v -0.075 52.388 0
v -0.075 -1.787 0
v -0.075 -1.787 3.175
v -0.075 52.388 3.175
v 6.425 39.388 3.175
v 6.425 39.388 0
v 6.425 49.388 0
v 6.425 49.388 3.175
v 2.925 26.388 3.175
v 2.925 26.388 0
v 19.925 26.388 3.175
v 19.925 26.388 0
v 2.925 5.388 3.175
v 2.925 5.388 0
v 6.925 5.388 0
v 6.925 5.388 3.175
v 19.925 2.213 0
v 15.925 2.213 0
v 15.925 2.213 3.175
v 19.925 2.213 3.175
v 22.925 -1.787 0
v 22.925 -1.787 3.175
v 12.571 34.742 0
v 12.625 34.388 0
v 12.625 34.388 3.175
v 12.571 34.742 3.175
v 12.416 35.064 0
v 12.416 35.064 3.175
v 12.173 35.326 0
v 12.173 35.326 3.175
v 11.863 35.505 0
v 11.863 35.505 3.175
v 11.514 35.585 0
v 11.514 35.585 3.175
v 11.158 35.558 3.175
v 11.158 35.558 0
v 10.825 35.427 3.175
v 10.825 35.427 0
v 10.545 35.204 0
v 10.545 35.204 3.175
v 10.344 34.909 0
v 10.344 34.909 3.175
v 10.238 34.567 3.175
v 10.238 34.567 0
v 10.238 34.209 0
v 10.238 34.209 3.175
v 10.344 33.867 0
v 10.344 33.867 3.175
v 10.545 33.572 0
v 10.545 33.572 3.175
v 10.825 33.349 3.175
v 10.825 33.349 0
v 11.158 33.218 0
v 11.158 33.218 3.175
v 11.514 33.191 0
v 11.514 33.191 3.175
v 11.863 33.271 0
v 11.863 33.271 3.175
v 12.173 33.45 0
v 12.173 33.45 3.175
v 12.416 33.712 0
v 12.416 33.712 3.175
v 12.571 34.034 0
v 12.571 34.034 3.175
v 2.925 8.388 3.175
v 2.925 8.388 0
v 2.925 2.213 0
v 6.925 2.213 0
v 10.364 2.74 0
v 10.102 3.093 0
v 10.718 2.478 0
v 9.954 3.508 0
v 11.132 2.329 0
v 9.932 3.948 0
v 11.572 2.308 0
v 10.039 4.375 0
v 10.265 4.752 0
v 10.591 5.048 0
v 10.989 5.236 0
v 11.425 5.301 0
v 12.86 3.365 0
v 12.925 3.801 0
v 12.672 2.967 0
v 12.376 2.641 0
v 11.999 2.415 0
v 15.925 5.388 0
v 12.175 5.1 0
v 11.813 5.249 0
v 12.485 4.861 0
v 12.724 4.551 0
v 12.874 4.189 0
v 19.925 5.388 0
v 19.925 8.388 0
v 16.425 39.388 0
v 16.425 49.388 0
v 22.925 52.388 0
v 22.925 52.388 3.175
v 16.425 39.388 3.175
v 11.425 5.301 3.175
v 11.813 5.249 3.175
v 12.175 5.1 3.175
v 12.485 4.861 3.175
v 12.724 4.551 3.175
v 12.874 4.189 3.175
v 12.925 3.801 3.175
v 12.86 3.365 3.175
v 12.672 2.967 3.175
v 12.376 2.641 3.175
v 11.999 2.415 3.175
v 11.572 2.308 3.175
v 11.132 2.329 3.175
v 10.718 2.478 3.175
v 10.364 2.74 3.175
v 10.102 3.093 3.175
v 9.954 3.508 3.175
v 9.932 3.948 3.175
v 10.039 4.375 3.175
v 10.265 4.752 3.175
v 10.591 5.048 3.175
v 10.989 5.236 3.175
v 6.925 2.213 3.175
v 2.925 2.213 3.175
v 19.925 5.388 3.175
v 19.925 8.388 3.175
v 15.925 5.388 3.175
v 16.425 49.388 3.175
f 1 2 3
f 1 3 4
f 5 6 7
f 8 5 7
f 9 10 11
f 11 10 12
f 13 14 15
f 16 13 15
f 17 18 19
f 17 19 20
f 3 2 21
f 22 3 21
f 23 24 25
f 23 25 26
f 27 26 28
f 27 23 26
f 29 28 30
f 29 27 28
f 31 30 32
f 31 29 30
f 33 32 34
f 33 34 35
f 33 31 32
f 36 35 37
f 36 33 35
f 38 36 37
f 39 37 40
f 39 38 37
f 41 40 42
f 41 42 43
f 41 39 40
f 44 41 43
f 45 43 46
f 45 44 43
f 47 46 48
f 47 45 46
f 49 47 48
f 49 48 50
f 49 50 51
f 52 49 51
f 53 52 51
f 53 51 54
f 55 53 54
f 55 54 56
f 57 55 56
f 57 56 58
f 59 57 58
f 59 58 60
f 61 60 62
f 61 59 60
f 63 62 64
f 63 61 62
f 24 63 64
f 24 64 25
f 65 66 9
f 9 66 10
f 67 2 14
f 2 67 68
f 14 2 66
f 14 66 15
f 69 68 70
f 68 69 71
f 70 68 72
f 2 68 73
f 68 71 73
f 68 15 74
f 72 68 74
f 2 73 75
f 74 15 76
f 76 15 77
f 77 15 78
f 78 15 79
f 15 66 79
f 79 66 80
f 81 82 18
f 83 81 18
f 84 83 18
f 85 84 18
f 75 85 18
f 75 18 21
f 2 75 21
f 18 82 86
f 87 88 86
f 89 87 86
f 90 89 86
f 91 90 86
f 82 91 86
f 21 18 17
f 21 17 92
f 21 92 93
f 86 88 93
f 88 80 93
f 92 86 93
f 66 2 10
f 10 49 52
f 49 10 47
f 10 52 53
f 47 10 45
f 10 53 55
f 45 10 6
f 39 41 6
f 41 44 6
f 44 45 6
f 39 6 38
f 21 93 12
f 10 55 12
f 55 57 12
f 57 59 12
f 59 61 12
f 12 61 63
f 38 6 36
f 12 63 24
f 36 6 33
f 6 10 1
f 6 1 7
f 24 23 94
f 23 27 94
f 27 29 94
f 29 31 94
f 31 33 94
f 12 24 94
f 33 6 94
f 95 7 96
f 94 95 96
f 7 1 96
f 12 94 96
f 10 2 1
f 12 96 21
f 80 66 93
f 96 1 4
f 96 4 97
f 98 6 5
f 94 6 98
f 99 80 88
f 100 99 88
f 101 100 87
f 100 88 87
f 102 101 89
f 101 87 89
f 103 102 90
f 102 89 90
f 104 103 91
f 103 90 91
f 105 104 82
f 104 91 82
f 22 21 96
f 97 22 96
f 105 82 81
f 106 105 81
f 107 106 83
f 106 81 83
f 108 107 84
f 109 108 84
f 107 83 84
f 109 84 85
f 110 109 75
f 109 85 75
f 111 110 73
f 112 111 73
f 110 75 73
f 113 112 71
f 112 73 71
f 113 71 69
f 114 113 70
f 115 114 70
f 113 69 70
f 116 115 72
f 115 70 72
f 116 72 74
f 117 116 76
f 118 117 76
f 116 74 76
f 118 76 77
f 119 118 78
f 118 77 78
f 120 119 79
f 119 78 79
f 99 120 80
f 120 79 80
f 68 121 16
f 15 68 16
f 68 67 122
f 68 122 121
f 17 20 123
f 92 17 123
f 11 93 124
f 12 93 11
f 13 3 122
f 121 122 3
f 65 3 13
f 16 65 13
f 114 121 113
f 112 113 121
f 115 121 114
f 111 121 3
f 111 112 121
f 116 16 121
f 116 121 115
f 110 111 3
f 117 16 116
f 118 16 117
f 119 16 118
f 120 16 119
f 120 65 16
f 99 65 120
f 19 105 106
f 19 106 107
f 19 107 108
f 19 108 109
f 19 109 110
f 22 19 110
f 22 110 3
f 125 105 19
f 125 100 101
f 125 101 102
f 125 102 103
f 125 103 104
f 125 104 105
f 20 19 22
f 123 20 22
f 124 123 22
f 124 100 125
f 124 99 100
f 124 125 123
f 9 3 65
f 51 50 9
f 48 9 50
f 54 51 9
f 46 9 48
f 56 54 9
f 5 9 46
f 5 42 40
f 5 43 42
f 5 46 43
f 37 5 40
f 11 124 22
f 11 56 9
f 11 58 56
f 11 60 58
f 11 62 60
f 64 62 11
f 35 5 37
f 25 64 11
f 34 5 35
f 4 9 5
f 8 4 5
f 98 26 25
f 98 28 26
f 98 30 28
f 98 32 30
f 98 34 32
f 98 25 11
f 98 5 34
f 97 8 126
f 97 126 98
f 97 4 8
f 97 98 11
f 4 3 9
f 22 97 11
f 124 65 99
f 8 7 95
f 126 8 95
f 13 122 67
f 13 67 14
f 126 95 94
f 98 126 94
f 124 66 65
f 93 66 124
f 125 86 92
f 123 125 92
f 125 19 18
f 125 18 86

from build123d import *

# Parameters (mm, degrees)
F0_W     = 23
F0_H     = 54.175
F0_W_2   = 4
F0_H_2   = 3.175
F0_W_3   = 17
F0_H_3   = 18
F0_W_4   = 10
F0_H_4   = 10
F0_R     = 1.2
F1_DEPTH = 3.175


# Not quite as in the source:
# - a length typed as a fraction of an inch, garbled in the dataset ("3 / 203.2 mm" for 3/8 in), is restored
# - a feature names something its author has since deleted; it is built from what else it names


with BuildPart() as f1:
    # F0 (on Top) → F1 (new body)
    with BuildSketch(Plane.XY):
        with Locations((11.4247928681, 25.3005515426)):
            Rectangle(F0_W, F0_H)
        with Locations((4.9247928681, 3.8005515426)):
            Rectangle(F0_W_2, F0_H_2, mode=Mode.SUBTRACT)
        with BuildLine():
            ThreePointArc((11.4247928681, 5.3005515426), (12.4854530398, 4.8612117144), (12.9247928681, 3.8005515426))
            ThreePointArc((12.9247928681, 3.8005515426), (10.3641326963, 2.7398913709), (11.4247928681, 5.3005515426))
        make_face(mode=Mode.SUBTRACT)
        with Locations((17.9247928681, 3.8005515426)):
            Rectangle(F0_W_2, F0_H_2, mode=Mode.SUBTRACT)
        with Locations((11.4247928681, 17.3880515426)):
            Rectangle(F0_W_3, F0_H_3, mode=Mode.SUBTRACT)
        Polygon((6.4247928681, 29.3880515426), (6.4247928681, 39.3880515426), (6.4247928681, 49.3880515426), (16.4247928681, 49.3880515426), (16.4247928681, 39.3880515426), (16.4247928681, 29.3880515426), align=None, mode=Mode.SUBTRACT)
        with Locations((11.4247928681, 34.3880515426)):
            Rectangle(F0_W_4, F0_H_4)
        with Locations((11.4247928681, 34.3880515426)):
            Circle(F0_R, mode=Mode.SUBTRACT)
    extrude(amount=F1_DEPTH)


solid = f1.part
